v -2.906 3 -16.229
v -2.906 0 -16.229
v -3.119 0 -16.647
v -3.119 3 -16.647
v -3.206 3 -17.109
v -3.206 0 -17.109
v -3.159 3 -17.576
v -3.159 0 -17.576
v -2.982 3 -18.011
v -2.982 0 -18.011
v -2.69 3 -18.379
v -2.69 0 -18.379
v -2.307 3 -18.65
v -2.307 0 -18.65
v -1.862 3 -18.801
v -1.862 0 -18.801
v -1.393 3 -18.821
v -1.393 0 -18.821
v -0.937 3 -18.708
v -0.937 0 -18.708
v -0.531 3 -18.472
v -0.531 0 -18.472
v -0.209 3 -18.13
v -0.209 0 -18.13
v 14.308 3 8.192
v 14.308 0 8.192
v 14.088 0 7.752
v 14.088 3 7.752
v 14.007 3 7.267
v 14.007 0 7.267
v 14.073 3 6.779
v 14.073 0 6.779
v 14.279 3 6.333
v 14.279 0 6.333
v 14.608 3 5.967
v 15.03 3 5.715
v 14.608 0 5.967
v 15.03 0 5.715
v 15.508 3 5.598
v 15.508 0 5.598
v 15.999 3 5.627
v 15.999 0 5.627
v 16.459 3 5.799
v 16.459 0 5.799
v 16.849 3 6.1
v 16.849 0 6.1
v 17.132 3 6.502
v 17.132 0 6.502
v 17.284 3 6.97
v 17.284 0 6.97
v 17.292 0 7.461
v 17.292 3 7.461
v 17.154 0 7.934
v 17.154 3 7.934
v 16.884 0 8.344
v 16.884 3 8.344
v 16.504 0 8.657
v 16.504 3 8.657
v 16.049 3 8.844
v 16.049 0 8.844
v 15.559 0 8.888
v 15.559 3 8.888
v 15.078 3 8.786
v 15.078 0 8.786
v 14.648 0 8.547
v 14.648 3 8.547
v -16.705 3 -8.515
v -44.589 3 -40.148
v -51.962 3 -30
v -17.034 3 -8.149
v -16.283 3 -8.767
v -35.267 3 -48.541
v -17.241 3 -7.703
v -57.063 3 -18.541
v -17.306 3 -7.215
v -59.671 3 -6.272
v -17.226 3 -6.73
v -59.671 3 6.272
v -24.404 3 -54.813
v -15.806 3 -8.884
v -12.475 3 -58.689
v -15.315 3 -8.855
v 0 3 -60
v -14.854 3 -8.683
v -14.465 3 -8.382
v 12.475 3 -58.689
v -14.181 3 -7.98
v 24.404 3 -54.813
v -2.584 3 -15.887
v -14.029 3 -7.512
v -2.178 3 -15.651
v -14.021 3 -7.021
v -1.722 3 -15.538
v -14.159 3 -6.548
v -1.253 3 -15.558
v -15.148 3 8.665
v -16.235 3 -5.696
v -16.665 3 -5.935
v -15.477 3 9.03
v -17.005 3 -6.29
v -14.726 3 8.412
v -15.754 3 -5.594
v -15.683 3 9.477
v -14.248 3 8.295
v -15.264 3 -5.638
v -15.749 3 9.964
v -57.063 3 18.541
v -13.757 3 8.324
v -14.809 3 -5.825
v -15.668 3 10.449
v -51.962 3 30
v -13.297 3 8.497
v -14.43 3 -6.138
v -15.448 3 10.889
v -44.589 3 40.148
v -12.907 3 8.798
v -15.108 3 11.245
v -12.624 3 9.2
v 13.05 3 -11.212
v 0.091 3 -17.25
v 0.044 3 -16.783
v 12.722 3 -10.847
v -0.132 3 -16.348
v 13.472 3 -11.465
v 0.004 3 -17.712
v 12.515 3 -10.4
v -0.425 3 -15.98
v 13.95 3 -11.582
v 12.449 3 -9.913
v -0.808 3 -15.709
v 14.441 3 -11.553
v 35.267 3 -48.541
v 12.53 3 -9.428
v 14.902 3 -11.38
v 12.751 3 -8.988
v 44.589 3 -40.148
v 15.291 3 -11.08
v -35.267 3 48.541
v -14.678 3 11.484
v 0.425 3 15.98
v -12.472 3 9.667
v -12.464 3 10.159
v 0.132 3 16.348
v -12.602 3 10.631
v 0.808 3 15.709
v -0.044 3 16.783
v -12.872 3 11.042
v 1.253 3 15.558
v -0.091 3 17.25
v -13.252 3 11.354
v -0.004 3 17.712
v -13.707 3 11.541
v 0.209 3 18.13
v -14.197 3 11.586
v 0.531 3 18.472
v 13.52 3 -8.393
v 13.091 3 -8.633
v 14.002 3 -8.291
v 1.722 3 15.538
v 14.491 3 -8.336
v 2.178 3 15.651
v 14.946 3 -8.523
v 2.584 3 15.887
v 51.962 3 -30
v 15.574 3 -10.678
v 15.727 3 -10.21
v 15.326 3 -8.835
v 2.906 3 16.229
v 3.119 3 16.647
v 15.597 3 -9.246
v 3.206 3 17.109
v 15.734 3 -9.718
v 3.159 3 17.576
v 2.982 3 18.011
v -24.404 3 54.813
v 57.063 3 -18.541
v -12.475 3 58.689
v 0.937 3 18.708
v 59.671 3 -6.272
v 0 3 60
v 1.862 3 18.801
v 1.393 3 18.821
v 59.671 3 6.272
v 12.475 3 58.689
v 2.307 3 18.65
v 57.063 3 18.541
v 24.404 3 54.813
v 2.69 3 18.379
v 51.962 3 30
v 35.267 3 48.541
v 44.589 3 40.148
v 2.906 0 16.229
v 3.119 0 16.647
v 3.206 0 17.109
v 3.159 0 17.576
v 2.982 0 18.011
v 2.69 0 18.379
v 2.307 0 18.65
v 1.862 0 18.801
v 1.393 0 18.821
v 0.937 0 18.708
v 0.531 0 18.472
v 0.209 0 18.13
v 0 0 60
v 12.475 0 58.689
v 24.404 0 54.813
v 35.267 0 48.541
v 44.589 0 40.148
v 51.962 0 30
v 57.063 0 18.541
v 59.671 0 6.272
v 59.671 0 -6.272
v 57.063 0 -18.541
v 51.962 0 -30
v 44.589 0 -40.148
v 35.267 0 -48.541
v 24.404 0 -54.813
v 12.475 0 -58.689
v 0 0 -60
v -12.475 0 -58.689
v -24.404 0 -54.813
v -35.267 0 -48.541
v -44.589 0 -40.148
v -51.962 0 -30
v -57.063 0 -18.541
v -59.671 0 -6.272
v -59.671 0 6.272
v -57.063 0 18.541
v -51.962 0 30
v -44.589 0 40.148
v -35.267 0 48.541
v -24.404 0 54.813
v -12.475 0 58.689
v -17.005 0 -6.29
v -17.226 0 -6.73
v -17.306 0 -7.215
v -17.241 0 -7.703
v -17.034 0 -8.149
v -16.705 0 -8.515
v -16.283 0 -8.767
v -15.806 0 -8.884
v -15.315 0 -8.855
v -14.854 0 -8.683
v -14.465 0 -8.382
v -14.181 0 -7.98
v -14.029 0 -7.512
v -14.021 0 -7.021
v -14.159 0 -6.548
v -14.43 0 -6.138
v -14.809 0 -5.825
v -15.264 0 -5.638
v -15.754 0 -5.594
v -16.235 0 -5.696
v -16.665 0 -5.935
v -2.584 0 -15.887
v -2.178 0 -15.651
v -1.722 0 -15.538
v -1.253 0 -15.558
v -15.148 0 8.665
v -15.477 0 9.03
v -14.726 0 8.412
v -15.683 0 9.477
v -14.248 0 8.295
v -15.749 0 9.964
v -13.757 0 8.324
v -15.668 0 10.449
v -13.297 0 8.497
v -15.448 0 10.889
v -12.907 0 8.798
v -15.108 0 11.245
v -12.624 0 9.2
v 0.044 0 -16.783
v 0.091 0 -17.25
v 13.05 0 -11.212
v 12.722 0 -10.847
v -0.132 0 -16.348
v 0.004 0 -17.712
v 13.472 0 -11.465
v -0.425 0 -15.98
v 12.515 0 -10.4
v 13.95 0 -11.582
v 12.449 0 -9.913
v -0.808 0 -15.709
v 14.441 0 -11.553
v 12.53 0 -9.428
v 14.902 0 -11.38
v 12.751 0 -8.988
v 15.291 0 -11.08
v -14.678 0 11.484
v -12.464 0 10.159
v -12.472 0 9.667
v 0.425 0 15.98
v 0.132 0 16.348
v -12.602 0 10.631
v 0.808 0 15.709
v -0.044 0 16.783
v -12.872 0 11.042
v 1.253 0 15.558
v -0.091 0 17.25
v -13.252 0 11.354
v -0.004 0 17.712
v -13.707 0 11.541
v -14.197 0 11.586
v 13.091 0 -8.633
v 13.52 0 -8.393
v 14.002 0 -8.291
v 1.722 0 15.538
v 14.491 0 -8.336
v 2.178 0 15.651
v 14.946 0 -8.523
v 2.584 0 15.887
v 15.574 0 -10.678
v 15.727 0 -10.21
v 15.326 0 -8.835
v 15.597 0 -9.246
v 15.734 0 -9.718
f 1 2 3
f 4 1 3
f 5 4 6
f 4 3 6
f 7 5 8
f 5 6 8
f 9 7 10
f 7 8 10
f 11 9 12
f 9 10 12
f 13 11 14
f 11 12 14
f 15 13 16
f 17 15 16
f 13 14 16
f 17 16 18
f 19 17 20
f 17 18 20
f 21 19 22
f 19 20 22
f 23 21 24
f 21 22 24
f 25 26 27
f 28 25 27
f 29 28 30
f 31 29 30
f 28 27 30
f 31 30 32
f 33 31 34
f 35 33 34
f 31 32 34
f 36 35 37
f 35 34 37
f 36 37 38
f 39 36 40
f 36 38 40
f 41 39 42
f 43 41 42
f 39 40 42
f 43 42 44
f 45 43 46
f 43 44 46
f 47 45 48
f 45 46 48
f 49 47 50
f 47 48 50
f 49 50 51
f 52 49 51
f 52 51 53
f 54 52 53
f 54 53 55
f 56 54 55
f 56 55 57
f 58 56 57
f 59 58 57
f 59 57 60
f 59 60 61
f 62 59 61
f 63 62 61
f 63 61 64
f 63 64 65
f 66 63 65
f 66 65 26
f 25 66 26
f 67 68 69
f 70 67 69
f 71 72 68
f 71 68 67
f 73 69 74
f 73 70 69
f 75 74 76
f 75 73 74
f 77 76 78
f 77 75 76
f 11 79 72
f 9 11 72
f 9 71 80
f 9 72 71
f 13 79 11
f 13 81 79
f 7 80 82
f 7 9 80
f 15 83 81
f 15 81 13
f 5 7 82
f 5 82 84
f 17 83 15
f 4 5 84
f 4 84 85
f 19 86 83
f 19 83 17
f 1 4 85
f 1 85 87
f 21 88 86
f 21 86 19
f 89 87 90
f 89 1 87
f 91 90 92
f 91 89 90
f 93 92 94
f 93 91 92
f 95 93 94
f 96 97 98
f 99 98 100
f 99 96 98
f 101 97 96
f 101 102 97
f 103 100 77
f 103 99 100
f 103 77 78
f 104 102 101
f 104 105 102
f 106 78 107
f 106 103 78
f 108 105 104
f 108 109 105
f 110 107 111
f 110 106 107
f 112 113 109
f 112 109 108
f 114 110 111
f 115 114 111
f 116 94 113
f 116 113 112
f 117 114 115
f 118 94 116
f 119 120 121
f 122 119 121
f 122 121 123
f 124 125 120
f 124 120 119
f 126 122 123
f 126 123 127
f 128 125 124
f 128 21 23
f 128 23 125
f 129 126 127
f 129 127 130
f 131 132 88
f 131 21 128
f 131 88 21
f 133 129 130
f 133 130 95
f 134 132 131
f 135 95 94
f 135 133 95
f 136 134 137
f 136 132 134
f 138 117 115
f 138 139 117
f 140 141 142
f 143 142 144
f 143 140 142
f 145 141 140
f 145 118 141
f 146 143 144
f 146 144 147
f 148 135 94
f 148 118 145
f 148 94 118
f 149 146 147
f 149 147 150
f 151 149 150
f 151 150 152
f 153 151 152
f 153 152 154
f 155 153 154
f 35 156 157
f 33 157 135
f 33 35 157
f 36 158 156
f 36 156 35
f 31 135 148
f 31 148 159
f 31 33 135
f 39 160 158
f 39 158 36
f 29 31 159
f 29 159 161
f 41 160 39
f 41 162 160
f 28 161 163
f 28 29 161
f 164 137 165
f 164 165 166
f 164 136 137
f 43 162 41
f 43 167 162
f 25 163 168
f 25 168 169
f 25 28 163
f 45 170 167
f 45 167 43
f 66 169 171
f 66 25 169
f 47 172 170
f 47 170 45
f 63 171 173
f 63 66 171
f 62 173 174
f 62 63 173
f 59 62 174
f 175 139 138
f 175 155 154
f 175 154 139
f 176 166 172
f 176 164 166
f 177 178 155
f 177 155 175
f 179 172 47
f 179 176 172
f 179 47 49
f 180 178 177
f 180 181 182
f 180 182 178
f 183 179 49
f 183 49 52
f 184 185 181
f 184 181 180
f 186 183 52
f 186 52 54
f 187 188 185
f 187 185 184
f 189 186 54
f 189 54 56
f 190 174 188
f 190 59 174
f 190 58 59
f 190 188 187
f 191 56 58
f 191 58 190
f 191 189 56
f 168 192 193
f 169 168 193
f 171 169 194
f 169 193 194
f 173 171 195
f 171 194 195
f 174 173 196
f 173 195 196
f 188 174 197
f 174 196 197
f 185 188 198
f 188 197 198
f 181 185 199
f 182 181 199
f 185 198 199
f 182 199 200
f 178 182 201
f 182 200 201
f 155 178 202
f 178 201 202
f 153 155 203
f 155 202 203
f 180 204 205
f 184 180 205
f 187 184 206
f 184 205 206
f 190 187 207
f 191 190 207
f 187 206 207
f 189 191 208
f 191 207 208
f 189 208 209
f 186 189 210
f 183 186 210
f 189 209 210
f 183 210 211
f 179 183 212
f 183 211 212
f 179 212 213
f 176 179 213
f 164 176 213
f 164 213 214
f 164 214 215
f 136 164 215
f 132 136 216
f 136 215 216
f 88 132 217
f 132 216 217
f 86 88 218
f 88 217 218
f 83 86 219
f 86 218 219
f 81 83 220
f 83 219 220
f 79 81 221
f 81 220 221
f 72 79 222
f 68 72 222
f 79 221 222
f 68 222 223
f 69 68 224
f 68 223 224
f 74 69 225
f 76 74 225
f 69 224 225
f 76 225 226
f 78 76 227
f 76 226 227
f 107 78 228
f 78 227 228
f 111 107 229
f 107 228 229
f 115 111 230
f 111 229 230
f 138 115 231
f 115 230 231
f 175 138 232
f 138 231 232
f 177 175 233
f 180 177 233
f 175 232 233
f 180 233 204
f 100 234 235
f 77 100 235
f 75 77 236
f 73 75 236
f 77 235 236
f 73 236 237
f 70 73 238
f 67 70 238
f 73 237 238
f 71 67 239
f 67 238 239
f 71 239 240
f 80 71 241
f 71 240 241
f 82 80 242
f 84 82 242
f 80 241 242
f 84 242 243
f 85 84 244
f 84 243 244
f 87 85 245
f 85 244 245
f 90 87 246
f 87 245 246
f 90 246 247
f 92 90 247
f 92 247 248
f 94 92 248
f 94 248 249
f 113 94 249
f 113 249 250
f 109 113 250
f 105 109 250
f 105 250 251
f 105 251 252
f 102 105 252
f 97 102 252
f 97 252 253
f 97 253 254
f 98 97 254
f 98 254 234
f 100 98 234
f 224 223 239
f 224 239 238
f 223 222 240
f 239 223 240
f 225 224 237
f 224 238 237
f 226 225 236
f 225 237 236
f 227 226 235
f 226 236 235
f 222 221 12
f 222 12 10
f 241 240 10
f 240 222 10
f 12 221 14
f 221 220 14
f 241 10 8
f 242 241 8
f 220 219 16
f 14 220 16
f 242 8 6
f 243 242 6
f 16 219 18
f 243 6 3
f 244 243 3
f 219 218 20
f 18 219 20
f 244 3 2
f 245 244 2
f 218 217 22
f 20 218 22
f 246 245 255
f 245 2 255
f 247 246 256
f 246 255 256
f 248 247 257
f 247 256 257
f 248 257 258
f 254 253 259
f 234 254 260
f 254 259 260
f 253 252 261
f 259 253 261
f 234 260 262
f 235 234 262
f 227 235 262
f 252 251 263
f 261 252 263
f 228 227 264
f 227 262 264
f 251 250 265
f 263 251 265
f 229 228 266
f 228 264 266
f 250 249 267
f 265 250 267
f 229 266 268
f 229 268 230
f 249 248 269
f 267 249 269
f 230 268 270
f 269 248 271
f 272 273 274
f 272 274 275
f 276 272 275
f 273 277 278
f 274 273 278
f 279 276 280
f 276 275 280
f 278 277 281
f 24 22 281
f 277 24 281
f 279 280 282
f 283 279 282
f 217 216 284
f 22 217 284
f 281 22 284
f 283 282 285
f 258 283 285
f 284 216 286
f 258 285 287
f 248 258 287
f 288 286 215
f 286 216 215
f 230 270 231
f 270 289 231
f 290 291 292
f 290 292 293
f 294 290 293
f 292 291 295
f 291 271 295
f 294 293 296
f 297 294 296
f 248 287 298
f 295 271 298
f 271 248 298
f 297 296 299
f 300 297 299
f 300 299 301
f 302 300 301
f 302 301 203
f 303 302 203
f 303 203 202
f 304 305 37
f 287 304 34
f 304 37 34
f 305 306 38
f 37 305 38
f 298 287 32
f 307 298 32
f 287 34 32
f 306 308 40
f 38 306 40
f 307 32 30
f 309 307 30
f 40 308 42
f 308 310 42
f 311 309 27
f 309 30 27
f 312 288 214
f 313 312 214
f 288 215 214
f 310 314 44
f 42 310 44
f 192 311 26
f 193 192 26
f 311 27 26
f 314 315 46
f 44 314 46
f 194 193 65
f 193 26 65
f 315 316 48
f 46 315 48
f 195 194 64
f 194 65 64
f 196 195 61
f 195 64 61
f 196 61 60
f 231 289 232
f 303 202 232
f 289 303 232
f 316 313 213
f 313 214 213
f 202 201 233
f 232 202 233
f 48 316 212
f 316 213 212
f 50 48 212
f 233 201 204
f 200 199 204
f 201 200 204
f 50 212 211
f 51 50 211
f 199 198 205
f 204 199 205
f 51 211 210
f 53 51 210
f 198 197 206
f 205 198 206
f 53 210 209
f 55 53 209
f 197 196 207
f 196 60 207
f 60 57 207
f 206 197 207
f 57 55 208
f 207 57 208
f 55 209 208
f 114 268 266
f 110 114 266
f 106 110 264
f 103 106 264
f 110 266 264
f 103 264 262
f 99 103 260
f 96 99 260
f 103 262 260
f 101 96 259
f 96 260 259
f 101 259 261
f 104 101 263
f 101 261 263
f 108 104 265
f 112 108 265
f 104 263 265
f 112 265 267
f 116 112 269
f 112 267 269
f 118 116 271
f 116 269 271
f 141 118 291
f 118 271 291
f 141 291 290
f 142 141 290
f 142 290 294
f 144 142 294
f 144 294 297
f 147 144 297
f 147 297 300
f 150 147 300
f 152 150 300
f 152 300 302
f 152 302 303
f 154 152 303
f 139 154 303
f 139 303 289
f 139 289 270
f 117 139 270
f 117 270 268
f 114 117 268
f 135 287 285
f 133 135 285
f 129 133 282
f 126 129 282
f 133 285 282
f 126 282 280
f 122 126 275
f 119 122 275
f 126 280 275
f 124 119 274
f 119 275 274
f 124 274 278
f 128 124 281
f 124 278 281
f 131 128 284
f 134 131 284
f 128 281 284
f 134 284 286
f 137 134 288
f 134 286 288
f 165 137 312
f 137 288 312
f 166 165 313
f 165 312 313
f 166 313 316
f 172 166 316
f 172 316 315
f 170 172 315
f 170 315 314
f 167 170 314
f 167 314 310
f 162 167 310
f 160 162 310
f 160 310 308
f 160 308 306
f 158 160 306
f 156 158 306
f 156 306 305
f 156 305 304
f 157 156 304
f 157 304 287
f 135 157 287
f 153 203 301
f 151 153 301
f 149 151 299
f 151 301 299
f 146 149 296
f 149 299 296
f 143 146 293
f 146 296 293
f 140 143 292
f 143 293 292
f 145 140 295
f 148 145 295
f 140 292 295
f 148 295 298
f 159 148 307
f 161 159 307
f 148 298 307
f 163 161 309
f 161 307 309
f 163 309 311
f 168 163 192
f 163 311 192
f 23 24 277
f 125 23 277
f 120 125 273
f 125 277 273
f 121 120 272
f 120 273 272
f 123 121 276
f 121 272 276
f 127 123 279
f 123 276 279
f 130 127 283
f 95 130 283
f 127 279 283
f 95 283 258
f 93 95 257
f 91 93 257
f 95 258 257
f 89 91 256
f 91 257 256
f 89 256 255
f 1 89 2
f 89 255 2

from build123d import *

# Parameters (mm, degrees)
SKETCH_2_R          = 60
EXTRUDE_1_DEPTH     = 3
CUT_EXTRUDE_1_DEPTH = 10


with BuildPart() as part:
    # 草图2 → 凸台-拉伸1 (new body)
    with BuildSketch(Plane(origin=(0, 0, 0), x_dir=(1, 0, 0), z_dir=(0, 1, 0))):
        with Locations(Location((0, 0, 0), (0, 0, 270))):
            Circle(SKETCH_2_R)
    extrude(amount=EXTRUDE_1_DEPTH)

    # 草图3 → 切除-拉伸1 (cut)
    with BuildSketch(Plane.XZ):
        with BuildLine():
            ThreePointArc((17.005273727, 6.290323162), (16.607301875, 8.589587915), (14.308037122, 8.191616063))
            ThreePointArc((14.308037122, 8.191616063), (14.706008974, 5.89235131), (17.005273727, 6.290323162))
        make_face()
        with BuildLine():
            ThreePointArc((15.447809647, -10.88922298), (15.049837795, -8.589958227), (12.750573042, -8.987930079))
            ThreePointArc((12.750573042, -8.987930079), (13.148544894, -11.287194832), (15.447809647, -10.88922298))
        make_face()
        with BuildLine():
            ThreePointArc((-0.208845777, -18.130192593), (-0.606817629, -15.830927839), (-2.906082382, -16.228899691))
            ThreePointArc((-2.906082382, -16.228899691), (-2.50811053, -18.528164444), (-0.208845777, -18.130192593))
        make_face()
        with BuildLine():
            ThreePointArc((-14.308037122, -8.191616063), (-14.706008974, -5.89235131), (-17.005273727, -6.290323162))
            ThreePointArc((-17.005273727, -6.290323162), (-16.607301875, -8.589587915), (-14.308037122, -8.191616063))
        make_face()
        with BuildLine():
            ThreePointArc((-12.750573042, 8.987930079), (-13.148544894, 11.287194832), (-15.447809647, 10.88922298))
            ThreePointArc((-15.447809647, 10.88922298), (-15.049837795, 8.589958227), (-12.750573042, 8.987930079))
        make_face()
        with BuildLine():
            ThreePointArc((2.906082382, 16.228899691), (2.50811053, 18.528164444), (0.208845777, 18.130192593))
            ThreePointArc((0.208845777, 18.130192593), (0.606817629, 15.830927839), (2.906082382, 16.228899691))
        make_face()
    extrude(amount=-CUT_EXTRUDE_1_DEPTH, mode=Mode.SUBTRACT)


solid = part.part
